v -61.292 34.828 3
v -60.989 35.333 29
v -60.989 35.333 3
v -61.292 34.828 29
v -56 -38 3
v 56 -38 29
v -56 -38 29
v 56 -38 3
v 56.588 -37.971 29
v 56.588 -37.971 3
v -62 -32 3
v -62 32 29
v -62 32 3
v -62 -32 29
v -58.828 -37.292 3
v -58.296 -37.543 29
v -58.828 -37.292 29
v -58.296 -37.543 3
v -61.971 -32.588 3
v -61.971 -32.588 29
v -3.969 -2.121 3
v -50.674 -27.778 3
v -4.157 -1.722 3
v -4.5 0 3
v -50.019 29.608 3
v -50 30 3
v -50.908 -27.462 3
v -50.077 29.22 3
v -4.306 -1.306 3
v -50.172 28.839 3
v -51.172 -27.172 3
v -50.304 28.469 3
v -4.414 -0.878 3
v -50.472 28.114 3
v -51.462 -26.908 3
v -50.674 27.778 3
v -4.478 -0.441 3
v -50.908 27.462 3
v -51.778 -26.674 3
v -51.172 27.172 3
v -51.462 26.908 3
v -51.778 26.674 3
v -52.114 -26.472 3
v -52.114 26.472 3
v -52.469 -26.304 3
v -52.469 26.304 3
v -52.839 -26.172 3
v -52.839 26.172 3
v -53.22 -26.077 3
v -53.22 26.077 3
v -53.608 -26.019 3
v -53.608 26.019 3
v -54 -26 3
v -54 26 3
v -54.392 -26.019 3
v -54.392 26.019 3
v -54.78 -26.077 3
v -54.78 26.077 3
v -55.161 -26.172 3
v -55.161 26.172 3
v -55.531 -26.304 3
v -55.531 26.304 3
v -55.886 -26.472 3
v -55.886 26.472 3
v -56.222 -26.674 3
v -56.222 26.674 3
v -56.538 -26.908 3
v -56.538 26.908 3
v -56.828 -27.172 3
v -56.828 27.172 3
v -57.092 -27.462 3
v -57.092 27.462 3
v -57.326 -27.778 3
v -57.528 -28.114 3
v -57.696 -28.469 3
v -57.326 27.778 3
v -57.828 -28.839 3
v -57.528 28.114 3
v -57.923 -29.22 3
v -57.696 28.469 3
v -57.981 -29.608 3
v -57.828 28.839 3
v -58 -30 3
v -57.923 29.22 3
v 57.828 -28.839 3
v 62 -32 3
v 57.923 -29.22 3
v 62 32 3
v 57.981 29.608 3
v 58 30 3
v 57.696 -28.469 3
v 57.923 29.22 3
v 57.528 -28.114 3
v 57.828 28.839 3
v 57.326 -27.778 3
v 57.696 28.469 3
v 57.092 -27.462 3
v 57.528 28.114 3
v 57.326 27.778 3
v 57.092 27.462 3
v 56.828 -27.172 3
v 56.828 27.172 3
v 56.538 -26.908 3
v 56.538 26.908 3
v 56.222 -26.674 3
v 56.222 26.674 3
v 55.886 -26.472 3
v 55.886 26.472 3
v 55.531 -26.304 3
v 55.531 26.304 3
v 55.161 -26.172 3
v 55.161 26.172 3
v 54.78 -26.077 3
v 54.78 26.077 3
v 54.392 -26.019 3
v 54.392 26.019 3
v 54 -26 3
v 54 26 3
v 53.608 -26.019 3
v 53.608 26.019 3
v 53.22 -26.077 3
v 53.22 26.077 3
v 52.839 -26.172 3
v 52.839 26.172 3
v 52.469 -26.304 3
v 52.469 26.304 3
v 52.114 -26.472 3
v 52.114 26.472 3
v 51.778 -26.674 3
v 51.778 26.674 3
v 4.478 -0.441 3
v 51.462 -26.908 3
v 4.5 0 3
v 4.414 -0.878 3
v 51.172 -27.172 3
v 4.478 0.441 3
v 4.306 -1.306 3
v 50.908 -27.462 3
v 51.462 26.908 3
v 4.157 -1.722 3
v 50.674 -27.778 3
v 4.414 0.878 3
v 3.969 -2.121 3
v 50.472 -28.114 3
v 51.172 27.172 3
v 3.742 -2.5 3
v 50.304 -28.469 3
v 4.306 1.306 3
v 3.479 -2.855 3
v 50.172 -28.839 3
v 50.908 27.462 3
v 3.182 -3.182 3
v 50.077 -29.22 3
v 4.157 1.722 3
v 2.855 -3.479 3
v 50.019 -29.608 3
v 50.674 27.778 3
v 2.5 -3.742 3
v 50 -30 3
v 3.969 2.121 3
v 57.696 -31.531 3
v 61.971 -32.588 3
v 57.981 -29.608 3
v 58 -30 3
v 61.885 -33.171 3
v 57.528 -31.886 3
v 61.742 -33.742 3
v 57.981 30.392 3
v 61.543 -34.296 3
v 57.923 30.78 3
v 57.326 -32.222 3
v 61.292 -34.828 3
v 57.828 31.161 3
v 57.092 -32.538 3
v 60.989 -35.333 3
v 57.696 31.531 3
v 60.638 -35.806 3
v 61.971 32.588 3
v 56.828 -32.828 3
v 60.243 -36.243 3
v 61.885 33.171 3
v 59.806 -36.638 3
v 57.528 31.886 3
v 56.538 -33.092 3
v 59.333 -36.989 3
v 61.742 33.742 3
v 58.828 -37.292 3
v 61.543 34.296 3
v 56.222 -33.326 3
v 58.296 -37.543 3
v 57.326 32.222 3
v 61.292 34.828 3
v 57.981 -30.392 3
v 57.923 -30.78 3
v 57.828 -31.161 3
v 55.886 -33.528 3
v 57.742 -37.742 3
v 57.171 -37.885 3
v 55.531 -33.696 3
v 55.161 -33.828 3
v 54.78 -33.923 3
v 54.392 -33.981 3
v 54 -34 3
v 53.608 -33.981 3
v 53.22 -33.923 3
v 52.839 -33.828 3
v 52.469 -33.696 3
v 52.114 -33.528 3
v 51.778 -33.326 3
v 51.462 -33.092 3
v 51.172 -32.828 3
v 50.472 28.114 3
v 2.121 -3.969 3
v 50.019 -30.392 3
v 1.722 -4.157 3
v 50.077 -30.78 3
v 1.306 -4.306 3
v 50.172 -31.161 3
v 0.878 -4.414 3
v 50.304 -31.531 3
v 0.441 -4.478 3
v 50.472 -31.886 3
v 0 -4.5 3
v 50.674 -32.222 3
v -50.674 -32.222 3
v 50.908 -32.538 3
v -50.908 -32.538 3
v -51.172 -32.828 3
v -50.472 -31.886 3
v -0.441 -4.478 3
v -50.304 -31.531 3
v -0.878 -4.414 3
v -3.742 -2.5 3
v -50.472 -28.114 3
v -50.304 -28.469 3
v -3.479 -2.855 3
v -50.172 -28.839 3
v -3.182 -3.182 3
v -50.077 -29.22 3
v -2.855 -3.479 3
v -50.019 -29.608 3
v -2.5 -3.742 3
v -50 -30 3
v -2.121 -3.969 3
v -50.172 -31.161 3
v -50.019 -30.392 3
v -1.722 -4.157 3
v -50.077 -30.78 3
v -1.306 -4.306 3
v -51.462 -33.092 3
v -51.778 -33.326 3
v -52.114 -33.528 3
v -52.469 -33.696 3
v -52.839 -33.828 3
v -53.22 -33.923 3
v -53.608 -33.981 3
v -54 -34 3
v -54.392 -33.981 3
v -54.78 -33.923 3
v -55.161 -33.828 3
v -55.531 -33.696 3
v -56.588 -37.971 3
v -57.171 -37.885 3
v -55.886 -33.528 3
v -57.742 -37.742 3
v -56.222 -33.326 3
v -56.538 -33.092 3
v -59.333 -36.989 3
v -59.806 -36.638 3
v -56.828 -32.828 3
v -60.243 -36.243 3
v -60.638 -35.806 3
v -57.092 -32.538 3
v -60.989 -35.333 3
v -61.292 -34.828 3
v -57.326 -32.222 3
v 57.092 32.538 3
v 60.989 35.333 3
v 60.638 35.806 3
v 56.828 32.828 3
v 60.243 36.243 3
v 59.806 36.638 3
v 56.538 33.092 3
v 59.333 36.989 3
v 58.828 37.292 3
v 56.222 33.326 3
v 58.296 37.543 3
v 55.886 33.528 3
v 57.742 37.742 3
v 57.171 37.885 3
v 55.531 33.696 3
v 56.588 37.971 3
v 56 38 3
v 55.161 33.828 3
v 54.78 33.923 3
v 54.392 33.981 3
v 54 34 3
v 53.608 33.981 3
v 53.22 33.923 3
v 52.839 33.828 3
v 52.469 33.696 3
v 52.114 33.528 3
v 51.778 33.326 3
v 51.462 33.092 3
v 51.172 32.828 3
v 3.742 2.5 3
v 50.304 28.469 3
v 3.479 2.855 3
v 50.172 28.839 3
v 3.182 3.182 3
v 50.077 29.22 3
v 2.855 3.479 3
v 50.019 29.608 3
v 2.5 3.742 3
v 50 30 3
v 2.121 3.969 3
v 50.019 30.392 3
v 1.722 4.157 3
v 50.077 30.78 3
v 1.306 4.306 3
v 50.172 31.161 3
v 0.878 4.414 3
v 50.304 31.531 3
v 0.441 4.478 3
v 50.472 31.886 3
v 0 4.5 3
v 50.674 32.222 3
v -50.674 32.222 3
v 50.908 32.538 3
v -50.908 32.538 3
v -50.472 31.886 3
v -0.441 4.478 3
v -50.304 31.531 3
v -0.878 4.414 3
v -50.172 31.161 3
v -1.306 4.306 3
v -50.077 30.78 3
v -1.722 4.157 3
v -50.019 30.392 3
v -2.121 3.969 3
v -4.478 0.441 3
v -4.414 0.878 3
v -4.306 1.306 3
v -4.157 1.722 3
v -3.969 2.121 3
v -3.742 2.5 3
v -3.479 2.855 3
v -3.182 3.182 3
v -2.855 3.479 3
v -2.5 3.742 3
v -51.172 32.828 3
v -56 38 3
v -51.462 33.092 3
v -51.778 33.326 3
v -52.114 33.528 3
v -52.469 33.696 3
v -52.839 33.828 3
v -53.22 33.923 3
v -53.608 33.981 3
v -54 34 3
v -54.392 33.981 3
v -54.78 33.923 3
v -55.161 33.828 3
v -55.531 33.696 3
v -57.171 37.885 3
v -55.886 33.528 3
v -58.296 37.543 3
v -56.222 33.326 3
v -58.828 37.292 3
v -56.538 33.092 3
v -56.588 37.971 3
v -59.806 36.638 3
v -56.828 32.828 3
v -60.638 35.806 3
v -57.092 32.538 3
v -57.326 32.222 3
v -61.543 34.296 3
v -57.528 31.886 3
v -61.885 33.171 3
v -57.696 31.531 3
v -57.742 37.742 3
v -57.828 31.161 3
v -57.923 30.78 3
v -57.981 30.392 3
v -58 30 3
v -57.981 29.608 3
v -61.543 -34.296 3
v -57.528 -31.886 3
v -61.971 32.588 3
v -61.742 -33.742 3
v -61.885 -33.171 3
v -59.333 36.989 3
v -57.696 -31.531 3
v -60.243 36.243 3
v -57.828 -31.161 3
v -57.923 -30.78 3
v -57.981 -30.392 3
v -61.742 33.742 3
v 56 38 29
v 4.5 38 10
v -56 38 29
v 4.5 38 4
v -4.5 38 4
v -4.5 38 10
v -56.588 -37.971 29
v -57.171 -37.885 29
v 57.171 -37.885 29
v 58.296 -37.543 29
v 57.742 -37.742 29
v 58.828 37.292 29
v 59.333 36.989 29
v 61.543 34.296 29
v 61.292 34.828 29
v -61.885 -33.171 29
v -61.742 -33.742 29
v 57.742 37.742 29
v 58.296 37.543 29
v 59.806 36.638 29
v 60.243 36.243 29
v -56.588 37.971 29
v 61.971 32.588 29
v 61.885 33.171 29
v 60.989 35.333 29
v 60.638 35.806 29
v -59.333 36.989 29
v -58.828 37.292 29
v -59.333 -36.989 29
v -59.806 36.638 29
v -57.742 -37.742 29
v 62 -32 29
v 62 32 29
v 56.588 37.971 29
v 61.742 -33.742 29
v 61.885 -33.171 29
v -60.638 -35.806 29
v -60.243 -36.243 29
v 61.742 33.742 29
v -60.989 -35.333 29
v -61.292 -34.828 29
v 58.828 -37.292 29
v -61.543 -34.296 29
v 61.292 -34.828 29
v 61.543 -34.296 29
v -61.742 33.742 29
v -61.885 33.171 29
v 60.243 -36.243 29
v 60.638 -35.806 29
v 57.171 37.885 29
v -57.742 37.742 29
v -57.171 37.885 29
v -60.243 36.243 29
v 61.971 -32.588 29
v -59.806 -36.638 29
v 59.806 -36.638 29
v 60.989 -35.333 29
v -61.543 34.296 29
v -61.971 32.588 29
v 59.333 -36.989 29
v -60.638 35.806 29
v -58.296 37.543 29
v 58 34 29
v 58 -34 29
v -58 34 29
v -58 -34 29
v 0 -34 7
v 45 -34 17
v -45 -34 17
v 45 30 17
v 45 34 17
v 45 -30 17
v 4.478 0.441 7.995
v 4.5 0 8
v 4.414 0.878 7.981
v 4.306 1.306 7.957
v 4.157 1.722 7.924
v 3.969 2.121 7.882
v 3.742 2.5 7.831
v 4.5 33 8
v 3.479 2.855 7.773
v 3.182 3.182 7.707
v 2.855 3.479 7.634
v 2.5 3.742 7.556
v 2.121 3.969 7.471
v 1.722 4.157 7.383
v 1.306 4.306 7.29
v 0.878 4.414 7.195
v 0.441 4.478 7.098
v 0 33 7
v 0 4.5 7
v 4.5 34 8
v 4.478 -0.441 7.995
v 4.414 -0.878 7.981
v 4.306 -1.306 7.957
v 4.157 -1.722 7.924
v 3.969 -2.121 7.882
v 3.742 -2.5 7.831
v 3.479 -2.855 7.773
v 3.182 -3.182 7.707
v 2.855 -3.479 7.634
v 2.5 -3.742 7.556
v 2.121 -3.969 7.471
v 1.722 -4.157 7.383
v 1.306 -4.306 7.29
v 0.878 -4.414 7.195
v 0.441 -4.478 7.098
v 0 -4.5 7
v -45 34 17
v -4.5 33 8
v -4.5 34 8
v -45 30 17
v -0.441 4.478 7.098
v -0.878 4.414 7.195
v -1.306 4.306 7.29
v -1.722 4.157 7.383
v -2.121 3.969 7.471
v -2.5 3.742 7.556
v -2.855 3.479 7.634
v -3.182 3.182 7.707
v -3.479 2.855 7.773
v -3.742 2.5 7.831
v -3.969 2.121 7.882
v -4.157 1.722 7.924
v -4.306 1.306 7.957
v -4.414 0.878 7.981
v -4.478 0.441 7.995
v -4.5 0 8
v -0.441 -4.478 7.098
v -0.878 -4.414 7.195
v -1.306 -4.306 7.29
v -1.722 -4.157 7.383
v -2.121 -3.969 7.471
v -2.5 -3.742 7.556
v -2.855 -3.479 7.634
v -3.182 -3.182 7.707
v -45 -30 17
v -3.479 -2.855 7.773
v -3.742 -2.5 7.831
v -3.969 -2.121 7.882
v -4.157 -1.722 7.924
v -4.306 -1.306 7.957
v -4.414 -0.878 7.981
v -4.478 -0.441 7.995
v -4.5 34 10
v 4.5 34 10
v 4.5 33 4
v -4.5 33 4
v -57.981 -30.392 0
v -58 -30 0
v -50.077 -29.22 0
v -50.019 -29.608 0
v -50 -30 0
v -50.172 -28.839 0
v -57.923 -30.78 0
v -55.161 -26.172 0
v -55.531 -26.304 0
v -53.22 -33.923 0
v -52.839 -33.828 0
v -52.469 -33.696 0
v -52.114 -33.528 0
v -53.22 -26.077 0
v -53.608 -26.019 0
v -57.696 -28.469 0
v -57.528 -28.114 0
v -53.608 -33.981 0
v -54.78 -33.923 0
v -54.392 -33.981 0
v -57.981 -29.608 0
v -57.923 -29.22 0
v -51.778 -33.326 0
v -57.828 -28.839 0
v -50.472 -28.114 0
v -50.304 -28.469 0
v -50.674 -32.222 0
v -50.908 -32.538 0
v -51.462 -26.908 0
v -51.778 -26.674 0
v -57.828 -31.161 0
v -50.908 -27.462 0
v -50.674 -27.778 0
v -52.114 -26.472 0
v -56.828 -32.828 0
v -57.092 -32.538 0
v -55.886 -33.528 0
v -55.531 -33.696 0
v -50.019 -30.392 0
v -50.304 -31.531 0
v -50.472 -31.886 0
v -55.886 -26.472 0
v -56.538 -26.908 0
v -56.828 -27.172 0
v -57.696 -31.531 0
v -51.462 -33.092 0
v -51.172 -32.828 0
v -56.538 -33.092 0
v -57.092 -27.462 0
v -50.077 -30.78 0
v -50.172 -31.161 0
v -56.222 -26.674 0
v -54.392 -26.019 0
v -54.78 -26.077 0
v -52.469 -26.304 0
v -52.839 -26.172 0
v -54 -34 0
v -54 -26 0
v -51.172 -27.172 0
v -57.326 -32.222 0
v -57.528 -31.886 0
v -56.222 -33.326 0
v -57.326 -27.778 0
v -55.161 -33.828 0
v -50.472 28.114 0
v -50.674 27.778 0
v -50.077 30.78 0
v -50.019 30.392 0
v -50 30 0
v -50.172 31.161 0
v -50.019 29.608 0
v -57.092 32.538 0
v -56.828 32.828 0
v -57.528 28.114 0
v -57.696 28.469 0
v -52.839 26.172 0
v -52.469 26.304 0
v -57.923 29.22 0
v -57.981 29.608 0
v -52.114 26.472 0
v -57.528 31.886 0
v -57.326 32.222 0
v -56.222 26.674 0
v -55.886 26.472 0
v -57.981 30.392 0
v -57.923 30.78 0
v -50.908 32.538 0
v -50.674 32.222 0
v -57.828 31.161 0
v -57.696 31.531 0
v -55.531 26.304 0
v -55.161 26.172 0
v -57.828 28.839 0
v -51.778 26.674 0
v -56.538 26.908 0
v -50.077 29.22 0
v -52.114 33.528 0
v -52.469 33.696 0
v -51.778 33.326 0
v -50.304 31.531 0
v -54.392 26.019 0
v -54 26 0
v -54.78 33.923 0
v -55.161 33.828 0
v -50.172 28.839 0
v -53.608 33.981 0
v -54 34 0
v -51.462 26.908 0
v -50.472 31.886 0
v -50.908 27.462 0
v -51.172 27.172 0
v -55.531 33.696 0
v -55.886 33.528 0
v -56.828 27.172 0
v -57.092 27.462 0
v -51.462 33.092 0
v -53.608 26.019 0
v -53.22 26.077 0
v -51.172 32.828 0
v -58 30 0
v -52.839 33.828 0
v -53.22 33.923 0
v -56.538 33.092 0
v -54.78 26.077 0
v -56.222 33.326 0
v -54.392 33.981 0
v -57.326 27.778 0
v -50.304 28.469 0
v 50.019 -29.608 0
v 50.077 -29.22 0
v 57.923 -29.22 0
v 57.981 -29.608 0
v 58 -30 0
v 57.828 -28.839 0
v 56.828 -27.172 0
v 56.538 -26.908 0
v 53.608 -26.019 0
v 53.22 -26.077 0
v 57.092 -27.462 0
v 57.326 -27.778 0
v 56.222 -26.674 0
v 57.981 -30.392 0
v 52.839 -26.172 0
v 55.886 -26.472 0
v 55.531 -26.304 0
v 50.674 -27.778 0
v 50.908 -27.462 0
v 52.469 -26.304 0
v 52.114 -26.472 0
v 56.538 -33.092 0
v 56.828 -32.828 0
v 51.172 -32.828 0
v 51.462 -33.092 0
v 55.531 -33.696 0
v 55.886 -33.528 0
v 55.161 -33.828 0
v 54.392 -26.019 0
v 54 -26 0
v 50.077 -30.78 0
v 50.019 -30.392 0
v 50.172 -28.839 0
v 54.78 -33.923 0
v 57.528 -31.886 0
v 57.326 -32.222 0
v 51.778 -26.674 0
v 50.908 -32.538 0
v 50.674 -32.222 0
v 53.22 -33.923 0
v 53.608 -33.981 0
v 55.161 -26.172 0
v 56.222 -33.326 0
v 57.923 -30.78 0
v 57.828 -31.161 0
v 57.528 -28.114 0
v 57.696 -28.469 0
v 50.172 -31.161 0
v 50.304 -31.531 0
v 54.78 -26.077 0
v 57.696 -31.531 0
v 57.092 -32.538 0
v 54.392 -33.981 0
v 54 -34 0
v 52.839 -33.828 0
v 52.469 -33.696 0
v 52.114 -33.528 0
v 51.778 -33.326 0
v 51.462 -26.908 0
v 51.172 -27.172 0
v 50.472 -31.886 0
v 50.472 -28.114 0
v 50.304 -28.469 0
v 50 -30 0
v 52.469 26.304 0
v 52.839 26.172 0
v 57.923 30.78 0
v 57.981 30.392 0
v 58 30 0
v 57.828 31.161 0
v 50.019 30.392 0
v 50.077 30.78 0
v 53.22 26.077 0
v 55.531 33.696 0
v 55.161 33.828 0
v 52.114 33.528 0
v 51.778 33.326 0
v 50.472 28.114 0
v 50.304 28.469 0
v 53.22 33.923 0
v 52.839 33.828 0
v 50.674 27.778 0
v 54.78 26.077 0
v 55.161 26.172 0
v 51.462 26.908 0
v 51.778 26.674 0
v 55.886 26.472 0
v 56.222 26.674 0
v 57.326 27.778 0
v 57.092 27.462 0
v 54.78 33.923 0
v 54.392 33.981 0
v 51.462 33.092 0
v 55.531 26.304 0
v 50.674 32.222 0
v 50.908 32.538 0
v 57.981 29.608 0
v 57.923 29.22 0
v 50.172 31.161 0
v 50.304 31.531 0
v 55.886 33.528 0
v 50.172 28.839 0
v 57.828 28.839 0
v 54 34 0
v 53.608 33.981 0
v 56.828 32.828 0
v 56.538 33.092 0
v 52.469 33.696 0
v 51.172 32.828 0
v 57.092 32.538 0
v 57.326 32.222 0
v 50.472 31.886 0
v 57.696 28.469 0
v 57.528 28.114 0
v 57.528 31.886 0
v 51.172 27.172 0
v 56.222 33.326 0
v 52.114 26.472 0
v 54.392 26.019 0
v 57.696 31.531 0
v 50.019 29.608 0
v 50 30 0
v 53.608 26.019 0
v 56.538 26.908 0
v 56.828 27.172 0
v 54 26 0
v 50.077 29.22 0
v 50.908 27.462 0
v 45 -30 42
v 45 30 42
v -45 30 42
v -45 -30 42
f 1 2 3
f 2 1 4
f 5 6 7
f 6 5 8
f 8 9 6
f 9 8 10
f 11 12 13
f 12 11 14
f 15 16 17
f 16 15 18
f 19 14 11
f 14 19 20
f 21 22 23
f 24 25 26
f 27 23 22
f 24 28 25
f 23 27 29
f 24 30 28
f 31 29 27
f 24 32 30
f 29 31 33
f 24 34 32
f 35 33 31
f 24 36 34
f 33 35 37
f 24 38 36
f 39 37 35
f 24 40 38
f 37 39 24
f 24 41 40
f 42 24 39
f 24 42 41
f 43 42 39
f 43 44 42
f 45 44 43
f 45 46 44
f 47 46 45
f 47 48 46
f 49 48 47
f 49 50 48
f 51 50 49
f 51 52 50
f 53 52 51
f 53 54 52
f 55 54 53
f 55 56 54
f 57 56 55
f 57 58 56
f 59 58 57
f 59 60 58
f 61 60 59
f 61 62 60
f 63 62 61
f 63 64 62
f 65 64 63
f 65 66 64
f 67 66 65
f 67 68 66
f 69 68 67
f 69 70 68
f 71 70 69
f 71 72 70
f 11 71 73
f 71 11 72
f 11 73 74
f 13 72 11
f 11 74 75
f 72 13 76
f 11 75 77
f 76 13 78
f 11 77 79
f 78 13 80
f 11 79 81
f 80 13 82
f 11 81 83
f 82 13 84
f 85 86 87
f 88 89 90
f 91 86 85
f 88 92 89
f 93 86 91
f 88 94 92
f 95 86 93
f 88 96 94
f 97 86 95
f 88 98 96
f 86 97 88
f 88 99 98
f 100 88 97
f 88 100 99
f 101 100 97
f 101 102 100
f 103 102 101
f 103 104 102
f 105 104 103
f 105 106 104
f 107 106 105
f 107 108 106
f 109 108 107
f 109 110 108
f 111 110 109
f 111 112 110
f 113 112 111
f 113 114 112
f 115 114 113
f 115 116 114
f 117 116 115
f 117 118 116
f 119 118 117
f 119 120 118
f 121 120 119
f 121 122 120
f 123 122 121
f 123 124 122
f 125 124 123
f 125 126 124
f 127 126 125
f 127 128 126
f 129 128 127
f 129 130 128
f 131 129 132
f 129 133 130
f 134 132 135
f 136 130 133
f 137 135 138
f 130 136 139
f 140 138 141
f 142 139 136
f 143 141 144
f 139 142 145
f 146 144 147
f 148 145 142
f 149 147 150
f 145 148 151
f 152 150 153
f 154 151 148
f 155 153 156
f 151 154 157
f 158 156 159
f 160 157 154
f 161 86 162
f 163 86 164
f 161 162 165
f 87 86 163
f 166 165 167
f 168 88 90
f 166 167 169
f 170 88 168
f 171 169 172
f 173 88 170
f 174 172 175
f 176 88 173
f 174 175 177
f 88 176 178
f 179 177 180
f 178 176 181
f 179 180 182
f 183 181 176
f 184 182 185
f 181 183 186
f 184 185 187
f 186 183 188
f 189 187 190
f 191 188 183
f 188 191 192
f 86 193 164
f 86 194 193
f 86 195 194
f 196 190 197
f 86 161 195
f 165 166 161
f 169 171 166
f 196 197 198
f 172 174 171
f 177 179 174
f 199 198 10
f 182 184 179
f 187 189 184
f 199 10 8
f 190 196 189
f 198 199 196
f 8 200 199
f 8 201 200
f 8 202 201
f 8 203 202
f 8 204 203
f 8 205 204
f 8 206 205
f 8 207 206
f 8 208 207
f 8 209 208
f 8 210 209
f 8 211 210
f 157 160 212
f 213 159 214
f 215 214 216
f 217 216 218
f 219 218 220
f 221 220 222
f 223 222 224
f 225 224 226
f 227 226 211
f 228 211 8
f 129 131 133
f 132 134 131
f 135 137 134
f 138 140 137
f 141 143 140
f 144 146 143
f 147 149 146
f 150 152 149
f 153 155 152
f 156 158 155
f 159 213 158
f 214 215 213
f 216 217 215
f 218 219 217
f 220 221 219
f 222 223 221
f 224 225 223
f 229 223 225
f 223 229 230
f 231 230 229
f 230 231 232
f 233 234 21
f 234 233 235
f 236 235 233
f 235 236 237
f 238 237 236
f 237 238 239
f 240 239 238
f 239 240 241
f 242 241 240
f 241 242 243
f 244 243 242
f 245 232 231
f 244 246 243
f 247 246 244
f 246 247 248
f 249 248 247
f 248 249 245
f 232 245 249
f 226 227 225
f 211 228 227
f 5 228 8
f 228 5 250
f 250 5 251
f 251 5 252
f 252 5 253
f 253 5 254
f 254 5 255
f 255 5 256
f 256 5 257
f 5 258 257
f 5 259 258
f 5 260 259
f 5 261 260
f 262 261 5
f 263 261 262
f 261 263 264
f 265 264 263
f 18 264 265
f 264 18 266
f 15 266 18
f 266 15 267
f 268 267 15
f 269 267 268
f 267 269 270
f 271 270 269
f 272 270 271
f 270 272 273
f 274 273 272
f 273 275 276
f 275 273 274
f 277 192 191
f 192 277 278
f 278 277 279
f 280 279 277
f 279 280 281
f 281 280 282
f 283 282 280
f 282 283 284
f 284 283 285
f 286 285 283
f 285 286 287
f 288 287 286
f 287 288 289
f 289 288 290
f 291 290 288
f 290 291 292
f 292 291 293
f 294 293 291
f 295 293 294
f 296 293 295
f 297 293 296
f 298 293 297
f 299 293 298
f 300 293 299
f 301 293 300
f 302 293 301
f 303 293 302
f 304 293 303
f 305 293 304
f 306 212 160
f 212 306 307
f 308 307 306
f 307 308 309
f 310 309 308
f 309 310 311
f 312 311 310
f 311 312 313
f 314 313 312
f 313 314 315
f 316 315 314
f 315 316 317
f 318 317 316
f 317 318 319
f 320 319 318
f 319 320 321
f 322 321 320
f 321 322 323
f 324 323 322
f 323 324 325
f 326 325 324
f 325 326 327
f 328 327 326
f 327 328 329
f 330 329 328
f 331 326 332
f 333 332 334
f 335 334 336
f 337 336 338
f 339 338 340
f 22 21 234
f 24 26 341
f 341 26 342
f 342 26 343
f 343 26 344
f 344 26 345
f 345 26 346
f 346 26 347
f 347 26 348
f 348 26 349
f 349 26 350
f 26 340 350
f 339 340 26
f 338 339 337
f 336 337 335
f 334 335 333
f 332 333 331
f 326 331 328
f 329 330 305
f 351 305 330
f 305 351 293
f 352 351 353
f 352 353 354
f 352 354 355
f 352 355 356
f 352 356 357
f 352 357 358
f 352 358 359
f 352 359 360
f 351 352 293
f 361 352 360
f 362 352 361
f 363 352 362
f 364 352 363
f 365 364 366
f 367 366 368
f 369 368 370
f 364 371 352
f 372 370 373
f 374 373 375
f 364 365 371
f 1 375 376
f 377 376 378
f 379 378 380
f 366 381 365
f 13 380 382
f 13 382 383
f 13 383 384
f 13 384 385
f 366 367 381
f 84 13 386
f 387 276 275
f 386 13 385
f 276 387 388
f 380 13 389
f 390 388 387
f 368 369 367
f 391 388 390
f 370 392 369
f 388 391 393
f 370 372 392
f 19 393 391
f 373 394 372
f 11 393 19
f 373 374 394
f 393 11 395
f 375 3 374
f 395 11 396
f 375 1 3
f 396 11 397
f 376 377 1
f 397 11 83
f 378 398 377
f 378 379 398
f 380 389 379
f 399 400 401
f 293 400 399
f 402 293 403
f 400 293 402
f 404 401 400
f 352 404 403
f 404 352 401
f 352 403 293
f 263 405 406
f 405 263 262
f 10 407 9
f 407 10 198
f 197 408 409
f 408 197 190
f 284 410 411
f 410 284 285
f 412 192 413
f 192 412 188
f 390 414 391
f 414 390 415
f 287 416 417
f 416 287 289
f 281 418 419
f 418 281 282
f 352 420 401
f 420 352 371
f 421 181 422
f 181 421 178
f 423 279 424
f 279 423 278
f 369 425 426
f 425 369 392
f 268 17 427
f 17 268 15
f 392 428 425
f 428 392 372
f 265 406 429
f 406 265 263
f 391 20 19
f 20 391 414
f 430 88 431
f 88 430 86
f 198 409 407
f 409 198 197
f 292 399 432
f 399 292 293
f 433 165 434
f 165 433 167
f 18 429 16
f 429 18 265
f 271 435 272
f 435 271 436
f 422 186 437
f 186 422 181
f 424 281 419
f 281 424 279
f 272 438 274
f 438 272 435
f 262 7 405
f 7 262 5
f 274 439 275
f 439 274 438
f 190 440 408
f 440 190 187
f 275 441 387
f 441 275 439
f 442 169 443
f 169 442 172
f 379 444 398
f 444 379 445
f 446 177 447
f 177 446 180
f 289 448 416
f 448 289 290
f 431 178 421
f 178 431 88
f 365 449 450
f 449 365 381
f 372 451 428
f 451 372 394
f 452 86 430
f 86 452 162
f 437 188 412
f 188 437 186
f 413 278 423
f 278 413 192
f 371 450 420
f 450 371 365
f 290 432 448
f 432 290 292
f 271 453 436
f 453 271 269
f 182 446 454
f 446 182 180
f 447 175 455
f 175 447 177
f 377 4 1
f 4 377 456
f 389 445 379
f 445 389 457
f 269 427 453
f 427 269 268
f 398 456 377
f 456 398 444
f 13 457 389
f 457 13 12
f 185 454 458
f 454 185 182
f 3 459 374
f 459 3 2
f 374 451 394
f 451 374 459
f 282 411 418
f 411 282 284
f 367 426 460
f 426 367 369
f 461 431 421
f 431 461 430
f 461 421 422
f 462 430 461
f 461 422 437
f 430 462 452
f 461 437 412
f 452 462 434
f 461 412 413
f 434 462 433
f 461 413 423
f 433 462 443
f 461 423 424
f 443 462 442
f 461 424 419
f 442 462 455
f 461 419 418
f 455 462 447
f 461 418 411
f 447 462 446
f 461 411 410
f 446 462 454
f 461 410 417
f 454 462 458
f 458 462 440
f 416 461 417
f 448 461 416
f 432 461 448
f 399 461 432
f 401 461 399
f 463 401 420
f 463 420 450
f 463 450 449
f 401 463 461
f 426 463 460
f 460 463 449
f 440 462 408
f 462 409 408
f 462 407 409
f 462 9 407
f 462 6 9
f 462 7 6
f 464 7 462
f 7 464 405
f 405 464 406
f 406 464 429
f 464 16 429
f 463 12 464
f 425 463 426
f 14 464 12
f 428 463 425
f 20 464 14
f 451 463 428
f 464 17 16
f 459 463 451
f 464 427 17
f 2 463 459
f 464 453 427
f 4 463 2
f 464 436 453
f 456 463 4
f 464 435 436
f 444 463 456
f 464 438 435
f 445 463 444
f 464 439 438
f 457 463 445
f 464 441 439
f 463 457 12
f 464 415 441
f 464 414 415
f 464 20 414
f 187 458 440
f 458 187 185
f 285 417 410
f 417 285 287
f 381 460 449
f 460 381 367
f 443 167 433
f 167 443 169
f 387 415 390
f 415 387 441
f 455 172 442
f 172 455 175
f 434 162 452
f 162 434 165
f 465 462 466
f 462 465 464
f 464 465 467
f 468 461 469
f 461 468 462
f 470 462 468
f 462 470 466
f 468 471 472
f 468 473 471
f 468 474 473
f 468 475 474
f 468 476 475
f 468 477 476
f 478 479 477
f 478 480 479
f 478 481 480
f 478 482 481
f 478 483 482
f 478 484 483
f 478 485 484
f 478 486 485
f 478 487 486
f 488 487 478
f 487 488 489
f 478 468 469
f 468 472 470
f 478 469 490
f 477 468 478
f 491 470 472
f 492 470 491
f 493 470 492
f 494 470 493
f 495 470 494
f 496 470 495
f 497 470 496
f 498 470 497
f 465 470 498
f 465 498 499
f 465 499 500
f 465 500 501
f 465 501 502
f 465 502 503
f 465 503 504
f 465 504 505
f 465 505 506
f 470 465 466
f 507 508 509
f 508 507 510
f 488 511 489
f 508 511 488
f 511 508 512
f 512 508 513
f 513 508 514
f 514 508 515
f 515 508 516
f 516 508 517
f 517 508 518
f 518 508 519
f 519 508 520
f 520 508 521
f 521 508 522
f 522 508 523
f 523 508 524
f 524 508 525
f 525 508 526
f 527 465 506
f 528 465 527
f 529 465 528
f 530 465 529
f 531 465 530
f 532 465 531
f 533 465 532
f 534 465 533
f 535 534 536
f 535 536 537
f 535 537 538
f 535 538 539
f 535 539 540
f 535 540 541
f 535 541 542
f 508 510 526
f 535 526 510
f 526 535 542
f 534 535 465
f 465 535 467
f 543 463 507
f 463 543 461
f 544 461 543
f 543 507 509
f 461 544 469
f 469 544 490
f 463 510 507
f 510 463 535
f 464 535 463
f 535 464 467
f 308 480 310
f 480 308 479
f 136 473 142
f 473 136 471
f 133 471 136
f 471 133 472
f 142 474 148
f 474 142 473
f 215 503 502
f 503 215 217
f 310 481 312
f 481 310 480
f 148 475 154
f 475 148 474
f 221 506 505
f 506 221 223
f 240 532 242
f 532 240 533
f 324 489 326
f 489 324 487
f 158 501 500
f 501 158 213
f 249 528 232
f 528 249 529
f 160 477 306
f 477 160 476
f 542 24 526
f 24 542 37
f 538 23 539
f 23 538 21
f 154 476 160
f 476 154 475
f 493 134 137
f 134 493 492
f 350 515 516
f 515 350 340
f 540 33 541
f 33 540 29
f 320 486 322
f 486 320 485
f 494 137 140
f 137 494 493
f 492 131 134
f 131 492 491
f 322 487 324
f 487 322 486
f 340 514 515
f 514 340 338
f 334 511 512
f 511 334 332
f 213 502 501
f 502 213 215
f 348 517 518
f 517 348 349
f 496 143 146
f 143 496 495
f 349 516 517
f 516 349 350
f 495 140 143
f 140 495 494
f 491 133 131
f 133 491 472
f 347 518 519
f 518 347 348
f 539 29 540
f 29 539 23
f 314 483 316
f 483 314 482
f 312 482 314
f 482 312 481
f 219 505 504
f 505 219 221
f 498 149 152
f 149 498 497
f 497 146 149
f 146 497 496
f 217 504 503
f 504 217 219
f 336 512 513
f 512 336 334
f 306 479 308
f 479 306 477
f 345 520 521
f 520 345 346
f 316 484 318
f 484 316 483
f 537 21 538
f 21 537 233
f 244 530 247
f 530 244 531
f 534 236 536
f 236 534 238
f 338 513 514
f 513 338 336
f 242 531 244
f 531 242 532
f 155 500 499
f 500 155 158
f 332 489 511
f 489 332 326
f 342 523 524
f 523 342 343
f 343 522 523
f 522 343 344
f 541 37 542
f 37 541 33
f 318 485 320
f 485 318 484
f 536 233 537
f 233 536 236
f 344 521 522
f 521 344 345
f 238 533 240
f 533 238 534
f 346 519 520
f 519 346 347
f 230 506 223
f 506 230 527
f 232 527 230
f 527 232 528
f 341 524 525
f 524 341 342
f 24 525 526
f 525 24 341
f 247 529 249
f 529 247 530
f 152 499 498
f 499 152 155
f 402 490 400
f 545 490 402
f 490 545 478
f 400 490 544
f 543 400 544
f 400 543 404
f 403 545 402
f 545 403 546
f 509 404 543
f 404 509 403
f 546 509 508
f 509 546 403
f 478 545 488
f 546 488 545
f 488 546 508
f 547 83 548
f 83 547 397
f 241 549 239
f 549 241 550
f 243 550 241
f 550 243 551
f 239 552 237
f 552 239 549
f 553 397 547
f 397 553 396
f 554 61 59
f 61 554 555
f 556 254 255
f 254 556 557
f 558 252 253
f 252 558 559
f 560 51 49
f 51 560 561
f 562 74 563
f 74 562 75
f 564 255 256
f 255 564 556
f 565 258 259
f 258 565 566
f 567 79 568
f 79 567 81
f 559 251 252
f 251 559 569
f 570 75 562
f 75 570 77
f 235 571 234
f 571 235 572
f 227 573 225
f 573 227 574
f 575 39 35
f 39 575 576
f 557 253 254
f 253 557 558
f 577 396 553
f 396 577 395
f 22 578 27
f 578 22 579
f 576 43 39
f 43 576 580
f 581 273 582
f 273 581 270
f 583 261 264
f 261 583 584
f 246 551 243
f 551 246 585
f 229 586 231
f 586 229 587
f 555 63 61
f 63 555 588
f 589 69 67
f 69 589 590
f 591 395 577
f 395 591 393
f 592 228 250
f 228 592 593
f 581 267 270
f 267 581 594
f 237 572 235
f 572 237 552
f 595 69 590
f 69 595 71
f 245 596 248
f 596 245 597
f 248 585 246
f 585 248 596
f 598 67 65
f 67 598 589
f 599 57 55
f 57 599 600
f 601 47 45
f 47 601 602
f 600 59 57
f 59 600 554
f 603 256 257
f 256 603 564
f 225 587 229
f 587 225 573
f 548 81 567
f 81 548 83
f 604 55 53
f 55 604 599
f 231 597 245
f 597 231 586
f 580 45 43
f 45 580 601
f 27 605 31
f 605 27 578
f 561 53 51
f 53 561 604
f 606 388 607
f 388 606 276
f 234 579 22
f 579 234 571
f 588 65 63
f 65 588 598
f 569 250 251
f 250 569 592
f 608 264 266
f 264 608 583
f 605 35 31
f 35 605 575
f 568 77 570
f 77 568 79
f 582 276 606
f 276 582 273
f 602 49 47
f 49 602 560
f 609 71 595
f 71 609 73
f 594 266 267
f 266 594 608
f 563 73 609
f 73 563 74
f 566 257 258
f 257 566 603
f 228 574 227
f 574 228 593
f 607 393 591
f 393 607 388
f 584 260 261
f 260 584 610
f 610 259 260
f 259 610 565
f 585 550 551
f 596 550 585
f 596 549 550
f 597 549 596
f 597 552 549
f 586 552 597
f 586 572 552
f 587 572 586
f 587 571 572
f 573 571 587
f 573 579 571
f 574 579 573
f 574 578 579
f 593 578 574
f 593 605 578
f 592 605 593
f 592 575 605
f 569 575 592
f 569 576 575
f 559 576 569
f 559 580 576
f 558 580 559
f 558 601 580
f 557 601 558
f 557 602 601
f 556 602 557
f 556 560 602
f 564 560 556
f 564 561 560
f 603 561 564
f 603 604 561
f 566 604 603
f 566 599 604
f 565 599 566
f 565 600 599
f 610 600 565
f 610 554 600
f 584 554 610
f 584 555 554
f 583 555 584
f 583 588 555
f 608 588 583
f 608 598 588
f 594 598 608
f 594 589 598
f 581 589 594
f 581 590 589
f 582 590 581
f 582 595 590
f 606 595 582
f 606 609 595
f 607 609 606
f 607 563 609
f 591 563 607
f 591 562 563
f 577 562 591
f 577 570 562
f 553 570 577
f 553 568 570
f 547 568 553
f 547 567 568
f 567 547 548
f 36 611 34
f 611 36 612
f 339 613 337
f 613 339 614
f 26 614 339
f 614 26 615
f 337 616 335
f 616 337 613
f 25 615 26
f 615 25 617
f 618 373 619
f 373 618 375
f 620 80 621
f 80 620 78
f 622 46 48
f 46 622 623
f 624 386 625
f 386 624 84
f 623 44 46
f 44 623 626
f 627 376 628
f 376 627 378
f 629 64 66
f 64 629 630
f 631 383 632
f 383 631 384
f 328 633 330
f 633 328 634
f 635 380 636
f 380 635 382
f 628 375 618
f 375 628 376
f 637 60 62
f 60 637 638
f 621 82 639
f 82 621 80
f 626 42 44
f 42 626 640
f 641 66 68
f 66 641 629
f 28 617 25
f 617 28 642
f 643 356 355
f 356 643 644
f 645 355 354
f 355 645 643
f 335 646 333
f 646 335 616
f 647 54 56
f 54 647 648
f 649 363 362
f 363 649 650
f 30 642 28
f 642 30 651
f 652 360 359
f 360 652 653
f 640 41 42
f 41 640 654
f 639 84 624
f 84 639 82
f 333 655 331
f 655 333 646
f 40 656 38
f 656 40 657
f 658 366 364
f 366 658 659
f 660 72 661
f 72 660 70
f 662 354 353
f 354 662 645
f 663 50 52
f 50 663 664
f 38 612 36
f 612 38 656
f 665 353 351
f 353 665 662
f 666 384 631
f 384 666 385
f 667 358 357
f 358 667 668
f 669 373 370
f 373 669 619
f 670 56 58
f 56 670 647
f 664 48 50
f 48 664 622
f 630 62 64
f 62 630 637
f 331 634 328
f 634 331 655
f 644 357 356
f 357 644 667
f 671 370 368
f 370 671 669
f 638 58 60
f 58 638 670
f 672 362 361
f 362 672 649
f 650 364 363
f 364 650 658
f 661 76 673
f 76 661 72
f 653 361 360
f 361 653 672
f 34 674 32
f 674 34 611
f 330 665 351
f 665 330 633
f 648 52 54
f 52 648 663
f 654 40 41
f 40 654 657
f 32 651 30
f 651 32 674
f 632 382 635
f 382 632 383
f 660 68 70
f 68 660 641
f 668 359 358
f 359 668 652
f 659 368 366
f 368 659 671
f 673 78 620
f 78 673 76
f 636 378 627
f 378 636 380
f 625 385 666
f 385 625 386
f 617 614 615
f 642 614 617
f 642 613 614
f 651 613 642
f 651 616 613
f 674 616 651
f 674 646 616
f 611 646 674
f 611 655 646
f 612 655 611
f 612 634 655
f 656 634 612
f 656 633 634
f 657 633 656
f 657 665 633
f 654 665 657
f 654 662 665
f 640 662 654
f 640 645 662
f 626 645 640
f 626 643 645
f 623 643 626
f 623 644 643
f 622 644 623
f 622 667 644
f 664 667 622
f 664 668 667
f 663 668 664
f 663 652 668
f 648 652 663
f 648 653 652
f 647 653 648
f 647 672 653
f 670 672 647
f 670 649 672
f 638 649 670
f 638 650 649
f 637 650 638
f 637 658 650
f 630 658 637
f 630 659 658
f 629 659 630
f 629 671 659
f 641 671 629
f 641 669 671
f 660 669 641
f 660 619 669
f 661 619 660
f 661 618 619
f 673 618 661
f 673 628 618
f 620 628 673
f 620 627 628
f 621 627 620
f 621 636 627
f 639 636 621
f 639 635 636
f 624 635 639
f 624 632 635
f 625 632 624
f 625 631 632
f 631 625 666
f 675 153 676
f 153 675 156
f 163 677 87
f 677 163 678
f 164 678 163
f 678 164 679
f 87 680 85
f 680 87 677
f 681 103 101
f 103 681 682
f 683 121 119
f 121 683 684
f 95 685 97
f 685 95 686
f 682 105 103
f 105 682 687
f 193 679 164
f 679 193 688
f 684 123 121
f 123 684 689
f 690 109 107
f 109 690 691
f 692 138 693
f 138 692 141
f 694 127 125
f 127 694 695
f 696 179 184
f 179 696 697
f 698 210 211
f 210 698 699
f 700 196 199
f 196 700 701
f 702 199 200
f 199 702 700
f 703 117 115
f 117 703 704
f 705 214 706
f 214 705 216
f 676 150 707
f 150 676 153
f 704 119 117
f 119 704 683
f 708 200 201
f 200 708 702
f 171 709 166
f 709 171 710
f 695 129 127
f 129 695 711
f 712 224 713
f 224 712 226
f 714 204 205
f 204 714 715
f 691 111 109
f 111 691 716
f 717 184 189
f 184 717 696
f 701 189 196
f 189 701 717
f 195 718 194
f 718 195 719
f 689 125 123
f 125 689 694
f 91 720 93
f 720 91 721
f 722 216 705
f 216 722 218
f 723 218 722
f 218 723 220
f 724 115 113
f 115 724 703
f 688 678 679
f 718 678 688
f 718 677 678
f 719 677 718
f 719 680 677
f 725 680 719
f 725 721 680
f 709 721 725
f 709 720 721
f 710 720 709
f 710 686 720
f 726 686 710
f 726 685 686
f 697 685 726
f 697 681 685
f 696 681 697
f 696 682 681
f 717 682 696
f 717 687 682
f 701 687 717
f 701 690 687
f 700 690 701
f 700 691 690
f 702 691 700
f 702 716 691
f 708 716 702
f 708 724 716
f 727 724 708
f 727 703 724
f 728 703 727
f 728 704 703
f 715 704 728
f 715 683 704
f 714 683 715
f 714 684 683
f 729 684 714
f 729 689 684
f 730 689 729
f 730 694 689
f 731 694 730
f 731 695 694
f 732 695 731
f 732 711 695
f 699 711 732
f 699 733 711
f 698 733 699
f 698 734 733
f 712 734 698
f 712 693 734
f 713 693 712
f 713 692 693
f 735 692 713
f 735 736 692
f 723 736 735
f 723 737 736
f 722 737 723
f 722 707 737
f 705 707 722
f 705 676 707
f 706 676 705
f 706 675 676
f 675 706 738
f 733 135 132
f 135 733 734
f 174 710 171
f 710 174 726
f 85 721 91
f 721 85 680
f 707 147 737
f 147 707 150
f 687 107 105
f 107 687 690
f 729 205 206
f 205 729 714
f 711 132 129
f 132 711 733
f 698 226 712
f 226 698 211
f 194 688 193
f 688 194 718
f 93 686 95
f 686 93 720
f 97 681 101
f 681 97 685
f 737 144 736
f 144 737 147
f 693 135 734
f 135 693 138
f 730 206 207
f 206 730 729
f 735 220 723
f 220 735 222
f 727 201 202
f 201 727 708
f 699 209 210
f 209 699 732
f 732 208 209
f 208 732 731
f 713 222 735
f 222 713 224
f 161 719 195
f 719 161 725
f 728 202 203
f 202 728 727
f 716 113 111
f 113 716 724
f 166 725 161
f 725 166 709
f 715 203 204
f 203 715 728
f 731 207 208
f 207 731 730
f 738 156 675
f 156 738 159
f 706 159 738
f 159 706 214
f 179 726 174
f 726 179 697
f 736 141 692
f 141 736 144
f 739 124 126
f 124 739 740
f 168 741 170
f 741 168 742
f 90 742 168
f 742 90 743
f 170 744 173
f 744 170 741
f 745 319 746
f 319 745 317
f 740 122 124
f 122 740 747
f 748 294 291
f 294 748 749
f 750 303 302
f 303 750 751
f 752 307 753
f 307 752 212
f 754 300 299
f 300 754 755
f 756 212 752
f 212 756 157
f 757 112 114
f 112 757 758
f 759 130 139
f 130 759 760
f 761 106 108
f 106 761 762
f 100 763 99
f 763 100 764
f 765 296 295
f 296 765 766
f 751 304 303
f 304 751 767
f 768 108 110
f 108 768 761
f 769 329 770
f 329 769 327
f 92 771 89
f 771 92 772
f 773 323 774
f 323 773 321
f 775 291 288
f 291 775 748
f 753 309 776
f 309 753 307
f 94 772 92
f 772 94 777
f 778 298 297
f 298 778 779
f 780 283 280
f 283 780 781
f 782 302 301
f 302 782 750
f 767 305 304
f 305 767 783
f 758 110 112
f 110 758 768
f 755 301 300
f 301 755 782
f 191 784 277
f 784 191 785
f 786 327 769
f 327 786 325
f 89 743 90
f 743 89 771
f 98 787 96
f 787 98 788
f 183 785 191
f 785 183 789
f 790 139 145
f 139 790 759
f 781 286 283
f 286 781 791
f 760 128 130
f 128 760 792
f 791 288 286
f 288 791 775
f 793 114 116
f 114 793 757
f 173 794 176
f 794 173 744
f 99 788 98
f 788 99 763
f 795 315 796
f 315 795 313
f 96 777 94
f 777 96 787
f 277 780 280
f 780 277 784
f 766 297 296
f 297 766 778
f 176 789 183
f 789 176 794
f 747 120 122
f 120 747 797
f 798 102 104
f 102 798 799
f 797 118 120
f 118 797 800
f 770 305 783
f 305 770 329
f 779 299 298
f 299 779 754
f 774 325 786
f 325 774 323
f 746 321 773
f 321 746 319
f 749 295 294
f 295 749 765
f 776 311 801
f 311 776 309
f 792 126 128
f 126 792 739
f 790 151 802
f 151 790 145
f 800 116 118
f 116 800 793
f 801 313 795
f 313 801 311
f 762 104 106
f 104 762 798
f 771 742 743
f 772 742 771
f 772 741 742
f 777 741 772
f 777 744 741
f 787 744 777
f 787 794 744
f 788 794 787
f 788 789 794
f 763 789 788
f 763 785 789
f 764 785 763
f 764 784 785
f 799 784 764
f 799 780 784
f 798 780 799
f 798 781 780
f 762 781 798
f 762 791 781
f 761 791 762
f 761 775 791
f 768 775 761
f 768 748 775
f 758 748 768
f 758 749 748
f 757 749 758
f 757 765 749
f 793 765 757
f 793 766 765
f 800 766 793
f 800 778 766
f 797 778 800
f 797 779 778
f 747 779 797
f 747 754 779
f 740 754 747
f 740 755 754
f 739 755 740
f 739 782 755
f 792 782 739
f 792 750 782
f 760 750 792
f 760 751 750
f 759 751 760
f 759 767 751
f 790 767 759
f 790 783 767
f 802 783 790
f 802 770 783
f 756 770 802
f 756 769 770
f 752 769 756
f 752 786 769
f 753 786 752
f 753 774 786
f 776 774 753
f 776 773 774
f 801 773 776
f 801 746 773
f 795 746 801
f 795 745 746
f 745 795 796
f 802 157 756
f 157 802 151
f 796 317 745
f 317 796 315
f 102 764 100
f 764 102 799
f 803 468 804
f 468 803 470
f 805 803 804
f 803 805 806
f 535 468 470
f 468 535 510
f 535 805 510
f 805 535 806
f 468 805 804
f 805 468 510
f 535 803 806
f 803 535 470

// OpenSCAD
// =============================================================================
//  TVÅLKOPP - självcentrerande, tvålen vilar vågrätt på kortsidornas nederkanter
// =============================================================================
//  Tvålen ses som ett rätblock:  L = långsida, W = kortsida, T = tjocklek.
//
//  Idé: två branta ändväggar (avstånd ~ L) stoppar tippning och centrerar på
//  längden, en flack v-ränna i mitten låter undersidan sväva fritt och torka,
//  och vattnet rinner till avloppshålet. Släpp tvålen ungefär rätt så glider
//  den till vågrätt jämviktsläge.
//
//  Öppna i OpenSCAD. Rendera (F6) och exportera STL för 3D-utskrift.
//  Alla mått i mm.
// =============================================================================

/* [Tvål] */
L = 90;     // långsida (tvålens längd)
W = 60;     // kortsida (tvålens bredd)
T = 25;     // tjocklek (tvålens höjd)

/* [Kopp] */
endrun   = 13;  // horisontell längd på brant ändvägg (stopp)
gap      = 10;  // luftspalt: hur högt tvålens underkant svävar i mitten
stop     = 12;  // hur högt ändväggen reser sig över viloläget
base     = 4;   // godstjocklek i botten
yclear   = 4;   // sidoglapp (per sida)
ywall    = 4;   // sidoväggens tjocklek
wallend  = 4;   // godstjocklek vid ändväggens topp
drain_d  = 9;   // avloppshålets diameter
feet_h   = 3;   // fothöjd (lyfter koppen för avrinning)

/* [Visning] */
show_soap = true;   // visa tvålen (genomskinlig) för referens
$fn = 64;

// --- härledda mått -----------------------------------------------------------
half  = L/2;
outL  = half + endrun;          // halva inre längden (fot -> rimtopp)
srest = base + gap;             // z för tvålens viloläge (underkant)
Htop  = base + stop + gap;      // rimtopp
yhi   = W/2 + yclear;           // inre halvbredd
yout  = yhi + ywall;            // yttre halvbredd
boxL  = outL + wallend;         // yttre halvlängd

// =============================================================================
module dish() {
    difference() {
        // ---- yttre kropp ----
        translate([0,0,feet_h])
            rounded_box(2*boxL, 2*yout, Htop, r=6);

        // ---- kavitet: extrudera luftprofilen (x-z) längs bredden ----
        translate([0, yhi, feet_h])
            rotate([90,0,0])
                linear_extrude(height = 2*yhi)
                    air_profile();

        // ---- avloppshål i mitten ----
        translate([0,0,-1])
            cylinder(d=drain_d, h=feet_h+base+2);

        // ---- liten avrinningsskåra ut genom en sidovägg ----
        translate([0, yout-ywall/2, feet_h+base])
            cube([drain_d, ywall+2, gap*0.6], center=true);
    }
    // ---- fötter ----
    for (sx=[-1,1], sy=[-1,1])
        translate([sx*(boxL-8), sy*(yout-8), 0])
            cylinder(d=8, h=feet_h);
}

// luftprofil i x-z: inre yta (v-ränna + branta ändväggar) + öppen topp
module air_profile() {
    polygon(points=[
        [-outL,           srest+stop],   // inre rimtopp vänster
        [-half,           srest    ],   // vänster fot (tvålens upplag)
        [ 0,              base     ],   // v-rännans botten (mitten)
        [ half,           srest    ],   // höger fot
        [ outL,           srest+stop],   // inre rimtopp höger
        [ outL,           Htop+10  ],   // upp i öppen topp
        [-outL,           Htop+10  ]
    ]);
}

module rounded_box(x, y, z, r=4) {
    hull() for (sx=[-1,1], sy=[-1,1])
        translate([sx*(x/2-r), sy*(y/2-r), 0])
            cylinder(r=r, h=z);
}

// =============================================================================
dish();

if (show_soap)
    color([0.12,0.37,0.75,0.40])
        translate([-half, -W/2, feet_h+srest])
            cube([L, W, T]);
